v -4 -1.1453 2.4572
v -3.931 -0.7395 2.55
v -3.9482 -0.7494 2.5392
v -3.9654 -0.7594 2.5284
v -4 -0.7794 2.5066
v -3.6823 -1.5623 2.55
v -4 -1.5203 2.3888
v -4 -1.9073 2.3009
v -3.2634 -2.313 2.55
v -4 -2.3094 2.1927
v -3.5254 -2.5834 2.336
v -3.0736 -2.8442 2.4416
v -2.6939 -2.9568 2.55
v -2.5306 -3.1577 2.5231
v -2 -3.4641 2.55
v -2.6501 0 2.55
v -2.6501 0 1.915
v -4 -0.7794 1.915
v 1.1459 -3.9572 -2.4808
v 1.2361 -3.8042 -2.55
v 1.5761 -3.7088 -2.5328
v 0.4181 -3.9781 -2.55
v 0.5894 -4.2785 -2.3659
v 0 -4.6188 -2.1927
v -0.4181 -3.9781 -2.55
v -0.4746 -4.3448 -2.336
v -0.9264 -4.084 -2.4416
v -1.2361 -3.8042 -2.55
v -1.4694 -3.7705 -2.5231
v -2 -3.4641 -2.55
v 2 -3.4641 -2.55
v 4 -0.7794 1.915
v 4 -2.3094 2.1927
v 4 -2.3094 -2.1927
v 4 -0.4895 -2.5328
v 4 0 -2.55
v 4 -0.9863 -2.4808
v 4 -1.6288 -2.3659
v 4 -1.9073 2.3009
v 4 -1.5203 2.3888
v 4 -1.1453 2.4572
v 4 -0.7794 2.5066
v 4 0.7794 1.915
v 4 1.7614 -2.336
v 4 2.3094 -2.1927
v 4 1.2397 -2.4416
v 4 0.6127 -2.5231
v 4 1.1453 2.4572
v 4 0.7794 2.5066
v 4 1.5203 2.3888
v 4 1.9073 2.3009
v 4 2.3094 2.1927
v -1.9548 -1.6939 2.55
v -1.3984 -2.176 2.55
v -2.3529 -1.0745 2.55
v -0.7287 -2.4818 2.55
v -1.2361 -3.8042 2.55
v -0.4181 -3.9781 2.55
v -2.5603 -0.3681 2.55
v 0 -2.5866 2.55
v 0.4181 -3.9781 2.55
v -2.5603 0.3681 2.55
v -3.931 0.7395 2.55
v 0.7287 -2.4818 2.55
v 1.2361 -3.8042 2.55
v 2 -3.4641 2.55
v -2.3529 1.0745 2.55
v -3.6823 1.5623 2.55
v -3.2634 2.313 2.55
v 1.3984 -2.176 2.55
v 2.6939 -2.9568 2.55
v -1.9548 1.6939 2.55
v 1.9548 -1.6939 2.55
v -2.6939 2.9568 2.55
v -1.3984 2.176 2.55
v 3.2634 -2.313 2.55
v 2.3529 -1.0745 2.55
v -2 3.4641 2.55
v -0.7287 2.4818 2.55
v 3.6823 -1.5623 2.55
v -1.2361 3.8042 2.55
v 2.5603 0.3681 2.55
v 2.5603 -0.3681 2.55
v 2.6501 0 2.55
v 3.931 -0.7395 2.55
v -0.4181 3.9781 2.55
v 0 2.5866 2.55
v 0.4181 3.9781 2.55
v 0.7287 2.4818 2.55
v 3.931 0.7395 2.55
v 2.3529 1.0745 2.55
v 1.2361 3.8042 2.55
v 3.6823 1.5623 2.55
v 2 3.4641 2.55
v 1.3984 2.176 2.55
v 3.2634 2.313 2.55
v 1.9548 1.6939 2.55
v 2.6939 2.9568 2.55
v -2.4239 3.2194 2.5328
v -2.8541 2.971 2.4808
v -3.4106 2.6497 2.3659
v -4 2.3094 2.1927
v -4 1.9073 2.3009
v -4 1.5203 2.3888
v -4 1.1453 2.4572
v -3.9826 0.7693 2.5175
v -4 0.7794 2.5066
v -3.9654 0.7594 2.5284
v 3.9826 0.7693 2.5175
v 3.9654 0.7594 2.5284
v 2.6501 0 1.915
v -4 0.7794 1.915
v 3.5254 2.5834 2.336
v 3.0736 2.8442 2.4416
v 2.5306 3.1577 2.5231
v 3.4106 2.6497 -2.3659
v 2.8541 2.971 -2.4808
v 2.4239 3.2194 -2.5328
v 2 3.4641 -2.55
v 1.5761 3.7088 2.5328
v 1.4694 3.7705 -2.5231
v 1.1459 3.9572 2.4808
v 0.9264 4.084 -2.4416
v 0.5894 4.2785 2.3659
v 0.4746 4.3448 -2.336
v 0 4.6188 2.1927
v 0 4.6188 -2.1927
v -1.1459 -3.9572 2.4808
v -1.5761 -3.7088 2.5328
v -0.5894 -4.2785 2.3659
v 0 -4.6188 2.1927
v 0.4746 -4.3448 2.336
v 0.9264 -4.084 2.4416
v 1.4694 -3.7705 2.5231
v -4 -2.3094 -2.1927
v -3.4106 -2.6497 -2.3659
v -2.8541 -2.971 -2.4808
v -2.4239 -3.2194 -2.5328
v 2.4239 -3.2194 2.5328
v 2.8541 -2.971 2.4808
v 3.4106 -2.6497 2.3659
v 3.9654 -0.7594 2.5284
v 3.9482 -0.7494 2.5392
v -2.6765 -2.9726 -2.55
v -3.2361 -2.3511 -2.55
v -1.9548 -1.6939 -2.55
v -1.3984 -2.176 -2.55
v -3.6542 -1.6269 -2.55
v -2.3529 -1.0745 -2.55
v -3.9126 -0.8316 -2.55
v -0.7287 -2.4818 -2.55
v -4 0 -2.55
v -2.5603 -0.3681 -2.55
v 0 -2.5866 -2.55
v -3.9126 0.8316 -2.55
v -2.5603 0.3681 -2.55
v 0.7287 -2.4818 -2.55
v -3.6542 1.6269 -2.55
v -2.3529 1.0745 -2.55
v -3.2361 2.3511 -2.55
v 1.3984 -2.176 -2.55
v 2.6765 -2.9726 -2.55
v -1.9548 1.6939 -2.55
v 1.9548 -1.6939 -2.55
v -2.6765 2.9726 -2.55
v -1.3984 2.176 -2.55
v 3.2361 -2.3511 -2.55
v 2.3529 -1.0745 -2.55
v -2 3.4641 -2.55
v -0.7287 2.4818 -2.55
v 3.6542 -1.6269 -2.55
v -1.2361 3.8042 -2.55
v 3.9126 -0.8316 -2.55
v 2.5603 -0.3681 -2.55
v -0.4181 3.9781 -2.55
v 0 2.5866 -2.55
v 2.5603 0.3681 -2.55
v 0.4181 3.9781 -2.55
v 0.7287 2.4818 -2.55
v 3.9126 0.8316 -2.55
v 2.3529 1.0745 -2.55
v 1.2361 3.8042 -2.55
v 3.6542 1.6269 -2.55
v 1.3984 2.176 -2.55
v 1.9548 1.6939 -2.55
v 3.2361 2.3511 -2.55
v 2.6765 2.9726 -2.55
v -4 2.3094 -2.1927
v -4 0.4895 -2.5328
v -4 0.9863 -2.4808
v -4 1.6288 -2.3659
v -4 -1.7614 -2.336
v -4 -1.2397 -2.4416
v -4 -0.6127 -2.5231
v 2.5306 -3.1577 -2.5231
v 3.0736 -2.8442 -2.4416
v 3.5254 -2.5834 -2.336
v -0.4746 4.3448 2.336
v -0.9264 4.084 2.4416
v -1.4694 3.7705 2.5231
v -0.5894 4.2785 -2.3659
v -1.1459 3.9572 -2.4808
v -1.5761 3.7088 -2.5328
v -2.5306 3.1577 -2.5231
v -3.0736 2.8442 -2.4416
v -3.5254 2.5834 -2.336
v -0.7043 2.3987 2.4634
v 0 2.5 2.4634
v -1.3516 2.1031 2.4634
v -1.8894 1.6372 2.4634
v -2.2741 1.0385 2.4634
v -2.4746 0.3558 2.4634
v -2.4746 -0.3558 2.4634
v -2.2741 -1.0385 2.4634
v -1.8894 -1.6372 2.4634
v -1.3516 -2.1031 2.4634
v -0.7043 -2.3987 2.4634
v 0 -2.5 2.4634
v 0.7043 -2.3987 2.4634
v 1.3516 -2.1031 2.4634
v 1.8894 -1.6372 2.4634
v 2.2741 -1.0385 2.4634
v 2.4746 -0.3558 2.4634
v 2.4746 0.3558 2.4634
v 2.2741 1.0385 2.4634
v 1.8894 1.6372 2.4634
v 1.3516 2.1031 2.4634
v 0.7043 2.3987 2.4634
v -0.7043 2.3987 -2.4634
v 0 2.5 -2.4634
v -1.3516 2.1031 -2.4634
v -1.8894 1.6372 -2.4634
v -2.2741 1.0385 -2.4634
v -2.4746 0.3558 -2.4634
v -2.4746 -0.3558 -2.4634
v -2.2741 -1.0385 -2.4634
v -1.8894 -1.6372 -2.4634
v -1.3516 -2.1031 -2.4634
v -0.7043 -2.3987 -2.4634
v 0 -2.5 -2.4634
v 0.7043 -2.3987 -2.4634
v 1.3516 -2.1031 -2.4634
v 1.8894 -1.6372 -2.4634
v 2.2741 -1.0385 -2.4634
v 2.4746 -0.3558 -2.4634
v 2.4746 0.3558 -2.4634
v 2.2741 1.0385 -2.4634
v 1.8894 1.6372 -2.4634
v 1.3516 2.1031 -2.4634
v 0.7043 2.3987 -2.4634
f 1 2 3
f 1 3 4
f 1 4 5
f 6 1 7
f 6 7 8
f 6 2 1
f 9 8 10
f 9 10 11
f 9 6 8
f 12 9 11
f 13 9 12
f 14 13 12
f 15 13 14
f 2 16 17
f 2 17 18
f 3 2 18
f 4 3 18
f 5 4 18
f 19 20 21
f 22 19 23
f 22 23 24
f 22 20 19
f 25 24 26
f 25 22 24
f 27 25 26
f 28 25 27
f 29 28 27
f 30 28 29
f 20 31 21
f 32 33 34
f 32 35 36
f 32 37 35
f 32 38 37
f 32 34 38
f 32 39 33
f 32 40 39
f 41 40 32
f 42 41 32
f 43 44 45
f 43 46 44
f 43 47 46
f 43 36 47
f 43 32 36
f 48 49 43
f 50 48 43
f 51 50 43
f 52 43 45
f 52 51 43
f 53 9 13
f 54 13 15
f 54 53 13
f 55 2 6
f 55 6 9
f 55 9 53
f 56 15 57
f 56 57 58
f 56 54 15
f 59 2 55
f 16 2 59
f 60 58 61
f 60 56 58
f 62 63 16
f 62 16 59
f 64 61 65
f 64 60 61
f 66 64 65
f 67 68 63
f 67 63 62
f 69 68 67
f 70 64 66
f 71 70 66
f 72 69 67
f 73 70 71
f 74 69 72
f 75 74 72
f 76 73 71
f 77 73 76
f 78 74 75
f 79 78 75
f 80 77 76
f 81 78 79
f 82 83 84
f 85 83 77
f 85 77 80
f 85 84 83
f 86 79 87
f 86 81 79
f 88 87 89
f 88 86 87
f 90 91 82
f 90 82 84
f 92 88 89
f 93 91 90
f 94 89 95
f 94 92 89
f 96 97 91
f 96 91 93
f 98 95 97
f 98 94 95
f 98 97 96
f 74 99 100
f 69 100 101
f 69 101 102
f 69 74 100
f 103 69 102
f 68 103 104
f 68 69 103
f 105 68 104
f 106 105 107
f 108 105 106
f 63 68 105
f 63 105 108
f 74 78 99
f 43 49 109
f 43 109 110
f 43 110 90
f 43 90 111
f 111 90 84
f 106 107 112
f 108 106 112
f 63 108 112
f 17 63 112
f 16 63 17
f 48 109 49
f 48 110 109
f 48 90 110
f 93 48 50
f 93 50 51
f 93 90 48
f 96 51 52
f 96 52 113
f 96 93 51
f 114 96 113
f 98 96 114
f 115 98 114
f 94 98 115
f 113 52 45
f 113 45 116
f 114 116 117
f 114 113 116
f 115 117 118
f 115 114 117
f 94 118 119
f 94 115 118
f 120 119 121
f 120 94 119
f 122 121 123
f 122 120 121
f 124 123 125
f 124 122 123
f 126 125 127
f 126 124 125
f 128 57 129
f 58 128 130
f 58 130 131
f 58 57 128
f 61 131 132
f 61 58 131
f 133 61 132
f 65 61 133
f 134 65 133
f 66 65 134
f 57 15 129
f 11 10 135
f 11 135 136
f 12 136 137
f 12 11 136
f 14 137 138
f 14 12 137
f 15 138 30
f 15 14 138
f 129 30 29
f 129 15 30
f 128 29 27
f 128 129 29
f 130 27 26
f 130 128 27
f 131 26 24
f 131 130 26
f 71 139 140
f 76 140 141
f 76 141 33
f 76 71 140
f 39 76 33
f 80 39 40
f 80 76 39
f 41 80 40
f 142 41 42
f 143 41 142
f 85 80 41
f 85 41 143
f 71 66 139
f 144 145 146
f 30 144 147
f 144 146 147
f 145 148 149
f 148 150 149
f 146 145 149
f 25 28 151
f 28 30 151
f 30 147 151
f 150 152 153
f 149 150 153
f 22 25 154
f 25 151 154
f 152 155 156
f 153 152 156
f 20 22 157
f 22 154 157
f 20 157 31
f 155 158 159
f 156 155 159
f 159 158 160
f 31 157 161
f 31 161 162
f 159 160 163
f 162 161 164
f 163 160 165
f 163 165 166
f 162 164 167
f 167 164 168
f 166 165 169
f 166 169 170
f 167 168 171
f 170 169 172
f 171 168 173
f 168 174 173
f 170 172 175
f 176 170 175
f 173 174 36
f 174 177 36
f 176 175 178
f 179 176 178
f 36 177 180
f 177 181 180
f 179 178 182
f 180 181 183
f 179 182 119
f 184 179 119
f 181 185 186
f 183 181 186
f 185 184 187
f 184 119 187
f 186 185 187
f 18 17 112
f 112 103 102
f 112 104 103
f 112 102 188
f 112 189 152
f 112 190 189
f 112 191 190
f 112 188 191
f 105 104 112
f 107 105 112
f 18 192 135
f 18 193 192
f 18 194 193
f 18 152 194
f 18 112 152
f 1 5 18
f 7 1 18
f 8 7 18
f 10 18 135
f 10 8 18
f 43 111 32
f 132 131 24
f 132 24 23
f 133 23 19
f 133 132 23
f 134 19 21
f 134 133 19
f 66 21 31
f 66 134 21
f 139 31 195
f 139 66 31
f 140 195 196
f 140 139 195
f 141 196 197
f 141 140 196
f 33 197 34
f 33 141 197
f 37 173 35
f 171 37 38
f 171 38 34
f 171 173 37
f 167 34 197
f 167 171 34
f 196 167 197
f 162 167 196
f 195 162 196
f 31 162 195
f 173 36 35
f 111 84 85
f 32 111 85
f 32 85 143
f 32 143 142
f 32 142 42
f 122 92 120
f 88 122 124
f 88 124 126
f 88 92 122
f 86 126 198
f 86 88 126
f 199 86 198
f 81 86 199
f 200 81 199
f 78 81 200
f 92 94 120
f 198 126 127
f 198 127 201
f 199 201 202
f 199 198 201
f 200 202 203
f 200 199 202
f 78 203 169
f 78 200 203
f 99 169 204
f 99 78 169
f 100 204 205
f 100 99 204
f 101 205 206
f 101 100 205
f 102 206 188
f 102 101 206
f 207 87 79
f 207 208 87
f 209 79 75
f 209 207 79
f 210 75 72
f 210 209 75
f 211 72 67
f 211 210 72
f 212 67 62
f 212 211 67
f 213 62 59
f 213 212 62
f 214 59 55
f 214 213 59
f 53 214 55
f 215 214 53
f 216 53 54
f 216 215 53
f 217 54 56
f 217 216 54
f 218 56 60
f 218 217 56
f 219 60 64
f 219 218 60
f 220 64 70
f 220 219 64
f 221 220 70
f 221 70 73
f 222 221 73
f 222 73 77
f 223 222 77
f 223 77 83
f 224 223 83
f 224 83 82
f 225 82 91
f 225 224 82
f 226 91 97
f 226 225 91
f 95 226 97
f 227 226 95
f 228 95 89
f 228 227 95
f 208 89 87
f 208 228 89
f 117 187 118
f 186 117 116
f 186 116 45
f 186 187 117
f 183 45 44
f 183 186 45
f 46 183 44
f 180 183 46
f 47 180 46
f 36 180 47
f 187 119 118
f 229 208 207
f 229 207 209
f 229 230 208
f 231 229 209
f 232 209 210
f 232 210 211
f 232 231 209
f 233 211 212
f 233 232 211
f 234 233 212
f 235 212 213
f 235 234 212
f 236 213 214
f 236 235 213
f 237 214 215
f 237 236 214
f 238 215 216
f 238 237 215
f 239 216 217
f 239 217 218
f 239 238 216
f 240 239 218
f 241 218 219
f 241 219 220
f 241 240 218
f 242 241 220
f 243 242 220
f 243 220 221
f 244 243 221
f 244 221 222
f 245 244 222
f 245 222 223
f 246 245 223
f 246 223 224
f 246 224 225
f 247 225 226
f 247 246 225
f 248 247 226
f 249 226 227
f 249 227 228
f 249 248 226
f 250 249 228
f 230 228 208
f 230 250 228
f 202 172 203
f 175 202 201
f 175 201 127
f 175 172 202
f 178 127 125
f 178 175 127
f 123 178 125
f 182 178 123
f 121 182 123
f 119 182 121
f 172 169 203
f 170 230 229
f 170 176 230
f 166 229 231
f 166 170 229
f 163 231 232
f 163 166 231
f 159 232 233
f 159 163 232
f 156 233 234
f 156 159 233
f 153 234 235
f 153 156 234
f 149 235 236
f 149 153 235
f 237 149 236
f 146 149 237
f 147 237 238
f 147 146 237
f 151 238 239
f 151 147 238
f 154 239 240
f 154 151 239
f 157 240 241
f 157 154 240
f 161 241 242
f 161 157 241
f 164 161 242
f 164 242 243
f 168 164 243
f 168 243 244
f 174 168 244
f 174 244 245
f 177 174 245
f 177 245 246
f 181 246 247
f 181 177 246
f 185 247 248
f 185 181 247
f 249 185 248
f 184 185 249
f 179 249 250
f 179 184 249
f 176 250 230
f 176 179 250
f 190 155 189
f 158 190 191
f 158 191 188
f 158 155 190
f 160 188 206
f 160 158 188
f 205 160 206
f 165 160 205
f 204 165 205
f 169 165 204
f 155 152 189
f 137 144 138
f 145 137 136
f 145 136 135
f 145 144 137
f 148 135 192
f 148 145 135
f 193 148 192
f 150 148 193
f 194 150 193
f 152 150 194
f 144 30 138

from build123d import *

# Parameters (mm, degrees)
BOSS_EXTRUDE1_DEPTH = 2.55
SKETCH5_OUTSIDE_W   = 43.682
SKETCH5_OUTSIDE_H   = 44.92
SKETCH5_OUTSIDE_R   = 4
CUT_EXTRUDE1_DEPTH  = 8.958852514
CUT_EXTRUDE1_DRAFT  = -60
SKETCH6_OUTSIDE_W   = 43.682
SKETCH6_OUTSIDE_H   = 44.92
SKETCH6_OUTSIDE_R   = 4
CUT_EXTRUDE2_DEPTH  = 8.958852514
CUT_EXTRUDE2_DRAFT  = -60
CUT_EXTRUDE3_DEPTH  = 0.635


with BuildPart() as part:
    # Sketch4 → Boss-Extrude1 (new, symmetric)
    with BuildSketch(Plane.XY):
        Polygon((-4, 2.309401077), (-4, -2.309401077), (0, -4.618802154), (4, -2.309401077), (4, 2.309401077), (0, 4.618802154), align=None)
    extrude(amount=BOSS_EXTRUDE1_DEPTH, both=True)


with BuildPart() as cut_extrude1_tool:
    # Sketch5 outside → Cut-Extrude1 (with draft: the straight prism first)
    with BuildSketch(Plane.XY.offset(2.55)):
        Rectangle(SKETCH5_OUTSIDE_W, SKETCH5_OUTSIDE_H)
        Circle(SKETCH5_OUTSIDE_R, mode=Mode.SUBTRACT)
    extrude(amount=-CUT_EXTRUDE1_DEPTH)
    # Cut-Extrude1: the draft: its side faces are tilted about the plane it starts from
    cut_extrude1_sides = [cut_extrude1_tool.faces().sort_by_distance(p)[0] for p in [
        (0, -22.46, -1.929426257),
        (21.841, 0, -1.929426257),
        (0, 22.46, -1.929426257),
        (-21.841, 0, -1.929426257),
        (-4, 0, -1.929426257),
    ]]
    draft(cut_extrude1_sides, Plane.XY.offset(2.55), CUT_EXTRUDE1_DRAFT)


with BuildPart() as part_1:
    add(part.part)

    # Cut-Extrude1: cut by cut_extrude1_tool
    add(cut_extrude1_tool.part, mode=Mode.SUBTRACT)


with BuildPart() as cut_extrude2_tool:
    # Sketch6 outside → Cut-Extrude2 (with draft: the straight prism first)
    with BuildSketch(Plane(origin=(0, 0, -2.55), x_dir=(-1, 0, 0), z_dir=(0, 0, -1))):
        Rectangle(SKETCH6_OUTSIDE_W, SKETCH6_OUTSIDE_H)
        Circle(SKETCH6_OUTSIDE_R, mode=Mode.SUBTRACT)
    extrude(amount=-CUT_EXTRUDE2_DEPTH)
    # Cut-Extrude2: the draft: its side faces are tilted about the plane it starts from
    cut_extrude2_sides = [cut_extrude2_tool.faces().sort_by_distance(p)[0] for p in [
        (0, -22.46, 1.929426257),
        (-21.841, 0, 1.929426257),
        (0, 22.46, 1.929426257),
        (21.841, 0, 1.929426257),
        (4, 0, 1.929426257),
    ]]
    draft(cut_extrude2_sides, Plane(origin=(0, 0, -2.55), x_dir=(-1, 0, 0), z_dir=(0, 0, -1)), CUT_EXTRUDE2_DRAFT)


with BuildPart() as part_2:
    add(part_1.part)

    # Cut-Extrude2: cut by cut_extrude2_tool
    add(cut_extrude2_tool.part, mode=Mode.SUBTRACT)

    # Sketch7 → Cut-Revolve1 (revolve, cut)
    with BuildSketch(Plane(origin=(0, 0, 0), x_dir=(0, 0, -1), z_dir=(1, 0, 0))):
        Polygon((2.55, 0), (-2.55, 0), (-2.55, 2.58660254), (-2.46339746, 2.5), (2.46339746, 2.5), (2.55, 2.58660254), align=None)
    revolve(axis=Axis((0, 0, -2.55), (0, 0, 1)), mode=Mode.SUBTRACT)

    # Sketch8 → Cut-Extrude3 (cut)
    with BuildSketch(Plane.XY.offset(2.55)):
        Polygon((-2.65010254, 0), (-4, -0.779363662), (-4, 0.779363662), align=None)
        Polygon((4, -0.779363662), (4, 0.779363662), (2.65010254, 0), align=None)
    extrude(amount=-CUT_EXTRUDE3_DEPTH, mode=Mode.SUBTRACT)


solid = part_2.part
